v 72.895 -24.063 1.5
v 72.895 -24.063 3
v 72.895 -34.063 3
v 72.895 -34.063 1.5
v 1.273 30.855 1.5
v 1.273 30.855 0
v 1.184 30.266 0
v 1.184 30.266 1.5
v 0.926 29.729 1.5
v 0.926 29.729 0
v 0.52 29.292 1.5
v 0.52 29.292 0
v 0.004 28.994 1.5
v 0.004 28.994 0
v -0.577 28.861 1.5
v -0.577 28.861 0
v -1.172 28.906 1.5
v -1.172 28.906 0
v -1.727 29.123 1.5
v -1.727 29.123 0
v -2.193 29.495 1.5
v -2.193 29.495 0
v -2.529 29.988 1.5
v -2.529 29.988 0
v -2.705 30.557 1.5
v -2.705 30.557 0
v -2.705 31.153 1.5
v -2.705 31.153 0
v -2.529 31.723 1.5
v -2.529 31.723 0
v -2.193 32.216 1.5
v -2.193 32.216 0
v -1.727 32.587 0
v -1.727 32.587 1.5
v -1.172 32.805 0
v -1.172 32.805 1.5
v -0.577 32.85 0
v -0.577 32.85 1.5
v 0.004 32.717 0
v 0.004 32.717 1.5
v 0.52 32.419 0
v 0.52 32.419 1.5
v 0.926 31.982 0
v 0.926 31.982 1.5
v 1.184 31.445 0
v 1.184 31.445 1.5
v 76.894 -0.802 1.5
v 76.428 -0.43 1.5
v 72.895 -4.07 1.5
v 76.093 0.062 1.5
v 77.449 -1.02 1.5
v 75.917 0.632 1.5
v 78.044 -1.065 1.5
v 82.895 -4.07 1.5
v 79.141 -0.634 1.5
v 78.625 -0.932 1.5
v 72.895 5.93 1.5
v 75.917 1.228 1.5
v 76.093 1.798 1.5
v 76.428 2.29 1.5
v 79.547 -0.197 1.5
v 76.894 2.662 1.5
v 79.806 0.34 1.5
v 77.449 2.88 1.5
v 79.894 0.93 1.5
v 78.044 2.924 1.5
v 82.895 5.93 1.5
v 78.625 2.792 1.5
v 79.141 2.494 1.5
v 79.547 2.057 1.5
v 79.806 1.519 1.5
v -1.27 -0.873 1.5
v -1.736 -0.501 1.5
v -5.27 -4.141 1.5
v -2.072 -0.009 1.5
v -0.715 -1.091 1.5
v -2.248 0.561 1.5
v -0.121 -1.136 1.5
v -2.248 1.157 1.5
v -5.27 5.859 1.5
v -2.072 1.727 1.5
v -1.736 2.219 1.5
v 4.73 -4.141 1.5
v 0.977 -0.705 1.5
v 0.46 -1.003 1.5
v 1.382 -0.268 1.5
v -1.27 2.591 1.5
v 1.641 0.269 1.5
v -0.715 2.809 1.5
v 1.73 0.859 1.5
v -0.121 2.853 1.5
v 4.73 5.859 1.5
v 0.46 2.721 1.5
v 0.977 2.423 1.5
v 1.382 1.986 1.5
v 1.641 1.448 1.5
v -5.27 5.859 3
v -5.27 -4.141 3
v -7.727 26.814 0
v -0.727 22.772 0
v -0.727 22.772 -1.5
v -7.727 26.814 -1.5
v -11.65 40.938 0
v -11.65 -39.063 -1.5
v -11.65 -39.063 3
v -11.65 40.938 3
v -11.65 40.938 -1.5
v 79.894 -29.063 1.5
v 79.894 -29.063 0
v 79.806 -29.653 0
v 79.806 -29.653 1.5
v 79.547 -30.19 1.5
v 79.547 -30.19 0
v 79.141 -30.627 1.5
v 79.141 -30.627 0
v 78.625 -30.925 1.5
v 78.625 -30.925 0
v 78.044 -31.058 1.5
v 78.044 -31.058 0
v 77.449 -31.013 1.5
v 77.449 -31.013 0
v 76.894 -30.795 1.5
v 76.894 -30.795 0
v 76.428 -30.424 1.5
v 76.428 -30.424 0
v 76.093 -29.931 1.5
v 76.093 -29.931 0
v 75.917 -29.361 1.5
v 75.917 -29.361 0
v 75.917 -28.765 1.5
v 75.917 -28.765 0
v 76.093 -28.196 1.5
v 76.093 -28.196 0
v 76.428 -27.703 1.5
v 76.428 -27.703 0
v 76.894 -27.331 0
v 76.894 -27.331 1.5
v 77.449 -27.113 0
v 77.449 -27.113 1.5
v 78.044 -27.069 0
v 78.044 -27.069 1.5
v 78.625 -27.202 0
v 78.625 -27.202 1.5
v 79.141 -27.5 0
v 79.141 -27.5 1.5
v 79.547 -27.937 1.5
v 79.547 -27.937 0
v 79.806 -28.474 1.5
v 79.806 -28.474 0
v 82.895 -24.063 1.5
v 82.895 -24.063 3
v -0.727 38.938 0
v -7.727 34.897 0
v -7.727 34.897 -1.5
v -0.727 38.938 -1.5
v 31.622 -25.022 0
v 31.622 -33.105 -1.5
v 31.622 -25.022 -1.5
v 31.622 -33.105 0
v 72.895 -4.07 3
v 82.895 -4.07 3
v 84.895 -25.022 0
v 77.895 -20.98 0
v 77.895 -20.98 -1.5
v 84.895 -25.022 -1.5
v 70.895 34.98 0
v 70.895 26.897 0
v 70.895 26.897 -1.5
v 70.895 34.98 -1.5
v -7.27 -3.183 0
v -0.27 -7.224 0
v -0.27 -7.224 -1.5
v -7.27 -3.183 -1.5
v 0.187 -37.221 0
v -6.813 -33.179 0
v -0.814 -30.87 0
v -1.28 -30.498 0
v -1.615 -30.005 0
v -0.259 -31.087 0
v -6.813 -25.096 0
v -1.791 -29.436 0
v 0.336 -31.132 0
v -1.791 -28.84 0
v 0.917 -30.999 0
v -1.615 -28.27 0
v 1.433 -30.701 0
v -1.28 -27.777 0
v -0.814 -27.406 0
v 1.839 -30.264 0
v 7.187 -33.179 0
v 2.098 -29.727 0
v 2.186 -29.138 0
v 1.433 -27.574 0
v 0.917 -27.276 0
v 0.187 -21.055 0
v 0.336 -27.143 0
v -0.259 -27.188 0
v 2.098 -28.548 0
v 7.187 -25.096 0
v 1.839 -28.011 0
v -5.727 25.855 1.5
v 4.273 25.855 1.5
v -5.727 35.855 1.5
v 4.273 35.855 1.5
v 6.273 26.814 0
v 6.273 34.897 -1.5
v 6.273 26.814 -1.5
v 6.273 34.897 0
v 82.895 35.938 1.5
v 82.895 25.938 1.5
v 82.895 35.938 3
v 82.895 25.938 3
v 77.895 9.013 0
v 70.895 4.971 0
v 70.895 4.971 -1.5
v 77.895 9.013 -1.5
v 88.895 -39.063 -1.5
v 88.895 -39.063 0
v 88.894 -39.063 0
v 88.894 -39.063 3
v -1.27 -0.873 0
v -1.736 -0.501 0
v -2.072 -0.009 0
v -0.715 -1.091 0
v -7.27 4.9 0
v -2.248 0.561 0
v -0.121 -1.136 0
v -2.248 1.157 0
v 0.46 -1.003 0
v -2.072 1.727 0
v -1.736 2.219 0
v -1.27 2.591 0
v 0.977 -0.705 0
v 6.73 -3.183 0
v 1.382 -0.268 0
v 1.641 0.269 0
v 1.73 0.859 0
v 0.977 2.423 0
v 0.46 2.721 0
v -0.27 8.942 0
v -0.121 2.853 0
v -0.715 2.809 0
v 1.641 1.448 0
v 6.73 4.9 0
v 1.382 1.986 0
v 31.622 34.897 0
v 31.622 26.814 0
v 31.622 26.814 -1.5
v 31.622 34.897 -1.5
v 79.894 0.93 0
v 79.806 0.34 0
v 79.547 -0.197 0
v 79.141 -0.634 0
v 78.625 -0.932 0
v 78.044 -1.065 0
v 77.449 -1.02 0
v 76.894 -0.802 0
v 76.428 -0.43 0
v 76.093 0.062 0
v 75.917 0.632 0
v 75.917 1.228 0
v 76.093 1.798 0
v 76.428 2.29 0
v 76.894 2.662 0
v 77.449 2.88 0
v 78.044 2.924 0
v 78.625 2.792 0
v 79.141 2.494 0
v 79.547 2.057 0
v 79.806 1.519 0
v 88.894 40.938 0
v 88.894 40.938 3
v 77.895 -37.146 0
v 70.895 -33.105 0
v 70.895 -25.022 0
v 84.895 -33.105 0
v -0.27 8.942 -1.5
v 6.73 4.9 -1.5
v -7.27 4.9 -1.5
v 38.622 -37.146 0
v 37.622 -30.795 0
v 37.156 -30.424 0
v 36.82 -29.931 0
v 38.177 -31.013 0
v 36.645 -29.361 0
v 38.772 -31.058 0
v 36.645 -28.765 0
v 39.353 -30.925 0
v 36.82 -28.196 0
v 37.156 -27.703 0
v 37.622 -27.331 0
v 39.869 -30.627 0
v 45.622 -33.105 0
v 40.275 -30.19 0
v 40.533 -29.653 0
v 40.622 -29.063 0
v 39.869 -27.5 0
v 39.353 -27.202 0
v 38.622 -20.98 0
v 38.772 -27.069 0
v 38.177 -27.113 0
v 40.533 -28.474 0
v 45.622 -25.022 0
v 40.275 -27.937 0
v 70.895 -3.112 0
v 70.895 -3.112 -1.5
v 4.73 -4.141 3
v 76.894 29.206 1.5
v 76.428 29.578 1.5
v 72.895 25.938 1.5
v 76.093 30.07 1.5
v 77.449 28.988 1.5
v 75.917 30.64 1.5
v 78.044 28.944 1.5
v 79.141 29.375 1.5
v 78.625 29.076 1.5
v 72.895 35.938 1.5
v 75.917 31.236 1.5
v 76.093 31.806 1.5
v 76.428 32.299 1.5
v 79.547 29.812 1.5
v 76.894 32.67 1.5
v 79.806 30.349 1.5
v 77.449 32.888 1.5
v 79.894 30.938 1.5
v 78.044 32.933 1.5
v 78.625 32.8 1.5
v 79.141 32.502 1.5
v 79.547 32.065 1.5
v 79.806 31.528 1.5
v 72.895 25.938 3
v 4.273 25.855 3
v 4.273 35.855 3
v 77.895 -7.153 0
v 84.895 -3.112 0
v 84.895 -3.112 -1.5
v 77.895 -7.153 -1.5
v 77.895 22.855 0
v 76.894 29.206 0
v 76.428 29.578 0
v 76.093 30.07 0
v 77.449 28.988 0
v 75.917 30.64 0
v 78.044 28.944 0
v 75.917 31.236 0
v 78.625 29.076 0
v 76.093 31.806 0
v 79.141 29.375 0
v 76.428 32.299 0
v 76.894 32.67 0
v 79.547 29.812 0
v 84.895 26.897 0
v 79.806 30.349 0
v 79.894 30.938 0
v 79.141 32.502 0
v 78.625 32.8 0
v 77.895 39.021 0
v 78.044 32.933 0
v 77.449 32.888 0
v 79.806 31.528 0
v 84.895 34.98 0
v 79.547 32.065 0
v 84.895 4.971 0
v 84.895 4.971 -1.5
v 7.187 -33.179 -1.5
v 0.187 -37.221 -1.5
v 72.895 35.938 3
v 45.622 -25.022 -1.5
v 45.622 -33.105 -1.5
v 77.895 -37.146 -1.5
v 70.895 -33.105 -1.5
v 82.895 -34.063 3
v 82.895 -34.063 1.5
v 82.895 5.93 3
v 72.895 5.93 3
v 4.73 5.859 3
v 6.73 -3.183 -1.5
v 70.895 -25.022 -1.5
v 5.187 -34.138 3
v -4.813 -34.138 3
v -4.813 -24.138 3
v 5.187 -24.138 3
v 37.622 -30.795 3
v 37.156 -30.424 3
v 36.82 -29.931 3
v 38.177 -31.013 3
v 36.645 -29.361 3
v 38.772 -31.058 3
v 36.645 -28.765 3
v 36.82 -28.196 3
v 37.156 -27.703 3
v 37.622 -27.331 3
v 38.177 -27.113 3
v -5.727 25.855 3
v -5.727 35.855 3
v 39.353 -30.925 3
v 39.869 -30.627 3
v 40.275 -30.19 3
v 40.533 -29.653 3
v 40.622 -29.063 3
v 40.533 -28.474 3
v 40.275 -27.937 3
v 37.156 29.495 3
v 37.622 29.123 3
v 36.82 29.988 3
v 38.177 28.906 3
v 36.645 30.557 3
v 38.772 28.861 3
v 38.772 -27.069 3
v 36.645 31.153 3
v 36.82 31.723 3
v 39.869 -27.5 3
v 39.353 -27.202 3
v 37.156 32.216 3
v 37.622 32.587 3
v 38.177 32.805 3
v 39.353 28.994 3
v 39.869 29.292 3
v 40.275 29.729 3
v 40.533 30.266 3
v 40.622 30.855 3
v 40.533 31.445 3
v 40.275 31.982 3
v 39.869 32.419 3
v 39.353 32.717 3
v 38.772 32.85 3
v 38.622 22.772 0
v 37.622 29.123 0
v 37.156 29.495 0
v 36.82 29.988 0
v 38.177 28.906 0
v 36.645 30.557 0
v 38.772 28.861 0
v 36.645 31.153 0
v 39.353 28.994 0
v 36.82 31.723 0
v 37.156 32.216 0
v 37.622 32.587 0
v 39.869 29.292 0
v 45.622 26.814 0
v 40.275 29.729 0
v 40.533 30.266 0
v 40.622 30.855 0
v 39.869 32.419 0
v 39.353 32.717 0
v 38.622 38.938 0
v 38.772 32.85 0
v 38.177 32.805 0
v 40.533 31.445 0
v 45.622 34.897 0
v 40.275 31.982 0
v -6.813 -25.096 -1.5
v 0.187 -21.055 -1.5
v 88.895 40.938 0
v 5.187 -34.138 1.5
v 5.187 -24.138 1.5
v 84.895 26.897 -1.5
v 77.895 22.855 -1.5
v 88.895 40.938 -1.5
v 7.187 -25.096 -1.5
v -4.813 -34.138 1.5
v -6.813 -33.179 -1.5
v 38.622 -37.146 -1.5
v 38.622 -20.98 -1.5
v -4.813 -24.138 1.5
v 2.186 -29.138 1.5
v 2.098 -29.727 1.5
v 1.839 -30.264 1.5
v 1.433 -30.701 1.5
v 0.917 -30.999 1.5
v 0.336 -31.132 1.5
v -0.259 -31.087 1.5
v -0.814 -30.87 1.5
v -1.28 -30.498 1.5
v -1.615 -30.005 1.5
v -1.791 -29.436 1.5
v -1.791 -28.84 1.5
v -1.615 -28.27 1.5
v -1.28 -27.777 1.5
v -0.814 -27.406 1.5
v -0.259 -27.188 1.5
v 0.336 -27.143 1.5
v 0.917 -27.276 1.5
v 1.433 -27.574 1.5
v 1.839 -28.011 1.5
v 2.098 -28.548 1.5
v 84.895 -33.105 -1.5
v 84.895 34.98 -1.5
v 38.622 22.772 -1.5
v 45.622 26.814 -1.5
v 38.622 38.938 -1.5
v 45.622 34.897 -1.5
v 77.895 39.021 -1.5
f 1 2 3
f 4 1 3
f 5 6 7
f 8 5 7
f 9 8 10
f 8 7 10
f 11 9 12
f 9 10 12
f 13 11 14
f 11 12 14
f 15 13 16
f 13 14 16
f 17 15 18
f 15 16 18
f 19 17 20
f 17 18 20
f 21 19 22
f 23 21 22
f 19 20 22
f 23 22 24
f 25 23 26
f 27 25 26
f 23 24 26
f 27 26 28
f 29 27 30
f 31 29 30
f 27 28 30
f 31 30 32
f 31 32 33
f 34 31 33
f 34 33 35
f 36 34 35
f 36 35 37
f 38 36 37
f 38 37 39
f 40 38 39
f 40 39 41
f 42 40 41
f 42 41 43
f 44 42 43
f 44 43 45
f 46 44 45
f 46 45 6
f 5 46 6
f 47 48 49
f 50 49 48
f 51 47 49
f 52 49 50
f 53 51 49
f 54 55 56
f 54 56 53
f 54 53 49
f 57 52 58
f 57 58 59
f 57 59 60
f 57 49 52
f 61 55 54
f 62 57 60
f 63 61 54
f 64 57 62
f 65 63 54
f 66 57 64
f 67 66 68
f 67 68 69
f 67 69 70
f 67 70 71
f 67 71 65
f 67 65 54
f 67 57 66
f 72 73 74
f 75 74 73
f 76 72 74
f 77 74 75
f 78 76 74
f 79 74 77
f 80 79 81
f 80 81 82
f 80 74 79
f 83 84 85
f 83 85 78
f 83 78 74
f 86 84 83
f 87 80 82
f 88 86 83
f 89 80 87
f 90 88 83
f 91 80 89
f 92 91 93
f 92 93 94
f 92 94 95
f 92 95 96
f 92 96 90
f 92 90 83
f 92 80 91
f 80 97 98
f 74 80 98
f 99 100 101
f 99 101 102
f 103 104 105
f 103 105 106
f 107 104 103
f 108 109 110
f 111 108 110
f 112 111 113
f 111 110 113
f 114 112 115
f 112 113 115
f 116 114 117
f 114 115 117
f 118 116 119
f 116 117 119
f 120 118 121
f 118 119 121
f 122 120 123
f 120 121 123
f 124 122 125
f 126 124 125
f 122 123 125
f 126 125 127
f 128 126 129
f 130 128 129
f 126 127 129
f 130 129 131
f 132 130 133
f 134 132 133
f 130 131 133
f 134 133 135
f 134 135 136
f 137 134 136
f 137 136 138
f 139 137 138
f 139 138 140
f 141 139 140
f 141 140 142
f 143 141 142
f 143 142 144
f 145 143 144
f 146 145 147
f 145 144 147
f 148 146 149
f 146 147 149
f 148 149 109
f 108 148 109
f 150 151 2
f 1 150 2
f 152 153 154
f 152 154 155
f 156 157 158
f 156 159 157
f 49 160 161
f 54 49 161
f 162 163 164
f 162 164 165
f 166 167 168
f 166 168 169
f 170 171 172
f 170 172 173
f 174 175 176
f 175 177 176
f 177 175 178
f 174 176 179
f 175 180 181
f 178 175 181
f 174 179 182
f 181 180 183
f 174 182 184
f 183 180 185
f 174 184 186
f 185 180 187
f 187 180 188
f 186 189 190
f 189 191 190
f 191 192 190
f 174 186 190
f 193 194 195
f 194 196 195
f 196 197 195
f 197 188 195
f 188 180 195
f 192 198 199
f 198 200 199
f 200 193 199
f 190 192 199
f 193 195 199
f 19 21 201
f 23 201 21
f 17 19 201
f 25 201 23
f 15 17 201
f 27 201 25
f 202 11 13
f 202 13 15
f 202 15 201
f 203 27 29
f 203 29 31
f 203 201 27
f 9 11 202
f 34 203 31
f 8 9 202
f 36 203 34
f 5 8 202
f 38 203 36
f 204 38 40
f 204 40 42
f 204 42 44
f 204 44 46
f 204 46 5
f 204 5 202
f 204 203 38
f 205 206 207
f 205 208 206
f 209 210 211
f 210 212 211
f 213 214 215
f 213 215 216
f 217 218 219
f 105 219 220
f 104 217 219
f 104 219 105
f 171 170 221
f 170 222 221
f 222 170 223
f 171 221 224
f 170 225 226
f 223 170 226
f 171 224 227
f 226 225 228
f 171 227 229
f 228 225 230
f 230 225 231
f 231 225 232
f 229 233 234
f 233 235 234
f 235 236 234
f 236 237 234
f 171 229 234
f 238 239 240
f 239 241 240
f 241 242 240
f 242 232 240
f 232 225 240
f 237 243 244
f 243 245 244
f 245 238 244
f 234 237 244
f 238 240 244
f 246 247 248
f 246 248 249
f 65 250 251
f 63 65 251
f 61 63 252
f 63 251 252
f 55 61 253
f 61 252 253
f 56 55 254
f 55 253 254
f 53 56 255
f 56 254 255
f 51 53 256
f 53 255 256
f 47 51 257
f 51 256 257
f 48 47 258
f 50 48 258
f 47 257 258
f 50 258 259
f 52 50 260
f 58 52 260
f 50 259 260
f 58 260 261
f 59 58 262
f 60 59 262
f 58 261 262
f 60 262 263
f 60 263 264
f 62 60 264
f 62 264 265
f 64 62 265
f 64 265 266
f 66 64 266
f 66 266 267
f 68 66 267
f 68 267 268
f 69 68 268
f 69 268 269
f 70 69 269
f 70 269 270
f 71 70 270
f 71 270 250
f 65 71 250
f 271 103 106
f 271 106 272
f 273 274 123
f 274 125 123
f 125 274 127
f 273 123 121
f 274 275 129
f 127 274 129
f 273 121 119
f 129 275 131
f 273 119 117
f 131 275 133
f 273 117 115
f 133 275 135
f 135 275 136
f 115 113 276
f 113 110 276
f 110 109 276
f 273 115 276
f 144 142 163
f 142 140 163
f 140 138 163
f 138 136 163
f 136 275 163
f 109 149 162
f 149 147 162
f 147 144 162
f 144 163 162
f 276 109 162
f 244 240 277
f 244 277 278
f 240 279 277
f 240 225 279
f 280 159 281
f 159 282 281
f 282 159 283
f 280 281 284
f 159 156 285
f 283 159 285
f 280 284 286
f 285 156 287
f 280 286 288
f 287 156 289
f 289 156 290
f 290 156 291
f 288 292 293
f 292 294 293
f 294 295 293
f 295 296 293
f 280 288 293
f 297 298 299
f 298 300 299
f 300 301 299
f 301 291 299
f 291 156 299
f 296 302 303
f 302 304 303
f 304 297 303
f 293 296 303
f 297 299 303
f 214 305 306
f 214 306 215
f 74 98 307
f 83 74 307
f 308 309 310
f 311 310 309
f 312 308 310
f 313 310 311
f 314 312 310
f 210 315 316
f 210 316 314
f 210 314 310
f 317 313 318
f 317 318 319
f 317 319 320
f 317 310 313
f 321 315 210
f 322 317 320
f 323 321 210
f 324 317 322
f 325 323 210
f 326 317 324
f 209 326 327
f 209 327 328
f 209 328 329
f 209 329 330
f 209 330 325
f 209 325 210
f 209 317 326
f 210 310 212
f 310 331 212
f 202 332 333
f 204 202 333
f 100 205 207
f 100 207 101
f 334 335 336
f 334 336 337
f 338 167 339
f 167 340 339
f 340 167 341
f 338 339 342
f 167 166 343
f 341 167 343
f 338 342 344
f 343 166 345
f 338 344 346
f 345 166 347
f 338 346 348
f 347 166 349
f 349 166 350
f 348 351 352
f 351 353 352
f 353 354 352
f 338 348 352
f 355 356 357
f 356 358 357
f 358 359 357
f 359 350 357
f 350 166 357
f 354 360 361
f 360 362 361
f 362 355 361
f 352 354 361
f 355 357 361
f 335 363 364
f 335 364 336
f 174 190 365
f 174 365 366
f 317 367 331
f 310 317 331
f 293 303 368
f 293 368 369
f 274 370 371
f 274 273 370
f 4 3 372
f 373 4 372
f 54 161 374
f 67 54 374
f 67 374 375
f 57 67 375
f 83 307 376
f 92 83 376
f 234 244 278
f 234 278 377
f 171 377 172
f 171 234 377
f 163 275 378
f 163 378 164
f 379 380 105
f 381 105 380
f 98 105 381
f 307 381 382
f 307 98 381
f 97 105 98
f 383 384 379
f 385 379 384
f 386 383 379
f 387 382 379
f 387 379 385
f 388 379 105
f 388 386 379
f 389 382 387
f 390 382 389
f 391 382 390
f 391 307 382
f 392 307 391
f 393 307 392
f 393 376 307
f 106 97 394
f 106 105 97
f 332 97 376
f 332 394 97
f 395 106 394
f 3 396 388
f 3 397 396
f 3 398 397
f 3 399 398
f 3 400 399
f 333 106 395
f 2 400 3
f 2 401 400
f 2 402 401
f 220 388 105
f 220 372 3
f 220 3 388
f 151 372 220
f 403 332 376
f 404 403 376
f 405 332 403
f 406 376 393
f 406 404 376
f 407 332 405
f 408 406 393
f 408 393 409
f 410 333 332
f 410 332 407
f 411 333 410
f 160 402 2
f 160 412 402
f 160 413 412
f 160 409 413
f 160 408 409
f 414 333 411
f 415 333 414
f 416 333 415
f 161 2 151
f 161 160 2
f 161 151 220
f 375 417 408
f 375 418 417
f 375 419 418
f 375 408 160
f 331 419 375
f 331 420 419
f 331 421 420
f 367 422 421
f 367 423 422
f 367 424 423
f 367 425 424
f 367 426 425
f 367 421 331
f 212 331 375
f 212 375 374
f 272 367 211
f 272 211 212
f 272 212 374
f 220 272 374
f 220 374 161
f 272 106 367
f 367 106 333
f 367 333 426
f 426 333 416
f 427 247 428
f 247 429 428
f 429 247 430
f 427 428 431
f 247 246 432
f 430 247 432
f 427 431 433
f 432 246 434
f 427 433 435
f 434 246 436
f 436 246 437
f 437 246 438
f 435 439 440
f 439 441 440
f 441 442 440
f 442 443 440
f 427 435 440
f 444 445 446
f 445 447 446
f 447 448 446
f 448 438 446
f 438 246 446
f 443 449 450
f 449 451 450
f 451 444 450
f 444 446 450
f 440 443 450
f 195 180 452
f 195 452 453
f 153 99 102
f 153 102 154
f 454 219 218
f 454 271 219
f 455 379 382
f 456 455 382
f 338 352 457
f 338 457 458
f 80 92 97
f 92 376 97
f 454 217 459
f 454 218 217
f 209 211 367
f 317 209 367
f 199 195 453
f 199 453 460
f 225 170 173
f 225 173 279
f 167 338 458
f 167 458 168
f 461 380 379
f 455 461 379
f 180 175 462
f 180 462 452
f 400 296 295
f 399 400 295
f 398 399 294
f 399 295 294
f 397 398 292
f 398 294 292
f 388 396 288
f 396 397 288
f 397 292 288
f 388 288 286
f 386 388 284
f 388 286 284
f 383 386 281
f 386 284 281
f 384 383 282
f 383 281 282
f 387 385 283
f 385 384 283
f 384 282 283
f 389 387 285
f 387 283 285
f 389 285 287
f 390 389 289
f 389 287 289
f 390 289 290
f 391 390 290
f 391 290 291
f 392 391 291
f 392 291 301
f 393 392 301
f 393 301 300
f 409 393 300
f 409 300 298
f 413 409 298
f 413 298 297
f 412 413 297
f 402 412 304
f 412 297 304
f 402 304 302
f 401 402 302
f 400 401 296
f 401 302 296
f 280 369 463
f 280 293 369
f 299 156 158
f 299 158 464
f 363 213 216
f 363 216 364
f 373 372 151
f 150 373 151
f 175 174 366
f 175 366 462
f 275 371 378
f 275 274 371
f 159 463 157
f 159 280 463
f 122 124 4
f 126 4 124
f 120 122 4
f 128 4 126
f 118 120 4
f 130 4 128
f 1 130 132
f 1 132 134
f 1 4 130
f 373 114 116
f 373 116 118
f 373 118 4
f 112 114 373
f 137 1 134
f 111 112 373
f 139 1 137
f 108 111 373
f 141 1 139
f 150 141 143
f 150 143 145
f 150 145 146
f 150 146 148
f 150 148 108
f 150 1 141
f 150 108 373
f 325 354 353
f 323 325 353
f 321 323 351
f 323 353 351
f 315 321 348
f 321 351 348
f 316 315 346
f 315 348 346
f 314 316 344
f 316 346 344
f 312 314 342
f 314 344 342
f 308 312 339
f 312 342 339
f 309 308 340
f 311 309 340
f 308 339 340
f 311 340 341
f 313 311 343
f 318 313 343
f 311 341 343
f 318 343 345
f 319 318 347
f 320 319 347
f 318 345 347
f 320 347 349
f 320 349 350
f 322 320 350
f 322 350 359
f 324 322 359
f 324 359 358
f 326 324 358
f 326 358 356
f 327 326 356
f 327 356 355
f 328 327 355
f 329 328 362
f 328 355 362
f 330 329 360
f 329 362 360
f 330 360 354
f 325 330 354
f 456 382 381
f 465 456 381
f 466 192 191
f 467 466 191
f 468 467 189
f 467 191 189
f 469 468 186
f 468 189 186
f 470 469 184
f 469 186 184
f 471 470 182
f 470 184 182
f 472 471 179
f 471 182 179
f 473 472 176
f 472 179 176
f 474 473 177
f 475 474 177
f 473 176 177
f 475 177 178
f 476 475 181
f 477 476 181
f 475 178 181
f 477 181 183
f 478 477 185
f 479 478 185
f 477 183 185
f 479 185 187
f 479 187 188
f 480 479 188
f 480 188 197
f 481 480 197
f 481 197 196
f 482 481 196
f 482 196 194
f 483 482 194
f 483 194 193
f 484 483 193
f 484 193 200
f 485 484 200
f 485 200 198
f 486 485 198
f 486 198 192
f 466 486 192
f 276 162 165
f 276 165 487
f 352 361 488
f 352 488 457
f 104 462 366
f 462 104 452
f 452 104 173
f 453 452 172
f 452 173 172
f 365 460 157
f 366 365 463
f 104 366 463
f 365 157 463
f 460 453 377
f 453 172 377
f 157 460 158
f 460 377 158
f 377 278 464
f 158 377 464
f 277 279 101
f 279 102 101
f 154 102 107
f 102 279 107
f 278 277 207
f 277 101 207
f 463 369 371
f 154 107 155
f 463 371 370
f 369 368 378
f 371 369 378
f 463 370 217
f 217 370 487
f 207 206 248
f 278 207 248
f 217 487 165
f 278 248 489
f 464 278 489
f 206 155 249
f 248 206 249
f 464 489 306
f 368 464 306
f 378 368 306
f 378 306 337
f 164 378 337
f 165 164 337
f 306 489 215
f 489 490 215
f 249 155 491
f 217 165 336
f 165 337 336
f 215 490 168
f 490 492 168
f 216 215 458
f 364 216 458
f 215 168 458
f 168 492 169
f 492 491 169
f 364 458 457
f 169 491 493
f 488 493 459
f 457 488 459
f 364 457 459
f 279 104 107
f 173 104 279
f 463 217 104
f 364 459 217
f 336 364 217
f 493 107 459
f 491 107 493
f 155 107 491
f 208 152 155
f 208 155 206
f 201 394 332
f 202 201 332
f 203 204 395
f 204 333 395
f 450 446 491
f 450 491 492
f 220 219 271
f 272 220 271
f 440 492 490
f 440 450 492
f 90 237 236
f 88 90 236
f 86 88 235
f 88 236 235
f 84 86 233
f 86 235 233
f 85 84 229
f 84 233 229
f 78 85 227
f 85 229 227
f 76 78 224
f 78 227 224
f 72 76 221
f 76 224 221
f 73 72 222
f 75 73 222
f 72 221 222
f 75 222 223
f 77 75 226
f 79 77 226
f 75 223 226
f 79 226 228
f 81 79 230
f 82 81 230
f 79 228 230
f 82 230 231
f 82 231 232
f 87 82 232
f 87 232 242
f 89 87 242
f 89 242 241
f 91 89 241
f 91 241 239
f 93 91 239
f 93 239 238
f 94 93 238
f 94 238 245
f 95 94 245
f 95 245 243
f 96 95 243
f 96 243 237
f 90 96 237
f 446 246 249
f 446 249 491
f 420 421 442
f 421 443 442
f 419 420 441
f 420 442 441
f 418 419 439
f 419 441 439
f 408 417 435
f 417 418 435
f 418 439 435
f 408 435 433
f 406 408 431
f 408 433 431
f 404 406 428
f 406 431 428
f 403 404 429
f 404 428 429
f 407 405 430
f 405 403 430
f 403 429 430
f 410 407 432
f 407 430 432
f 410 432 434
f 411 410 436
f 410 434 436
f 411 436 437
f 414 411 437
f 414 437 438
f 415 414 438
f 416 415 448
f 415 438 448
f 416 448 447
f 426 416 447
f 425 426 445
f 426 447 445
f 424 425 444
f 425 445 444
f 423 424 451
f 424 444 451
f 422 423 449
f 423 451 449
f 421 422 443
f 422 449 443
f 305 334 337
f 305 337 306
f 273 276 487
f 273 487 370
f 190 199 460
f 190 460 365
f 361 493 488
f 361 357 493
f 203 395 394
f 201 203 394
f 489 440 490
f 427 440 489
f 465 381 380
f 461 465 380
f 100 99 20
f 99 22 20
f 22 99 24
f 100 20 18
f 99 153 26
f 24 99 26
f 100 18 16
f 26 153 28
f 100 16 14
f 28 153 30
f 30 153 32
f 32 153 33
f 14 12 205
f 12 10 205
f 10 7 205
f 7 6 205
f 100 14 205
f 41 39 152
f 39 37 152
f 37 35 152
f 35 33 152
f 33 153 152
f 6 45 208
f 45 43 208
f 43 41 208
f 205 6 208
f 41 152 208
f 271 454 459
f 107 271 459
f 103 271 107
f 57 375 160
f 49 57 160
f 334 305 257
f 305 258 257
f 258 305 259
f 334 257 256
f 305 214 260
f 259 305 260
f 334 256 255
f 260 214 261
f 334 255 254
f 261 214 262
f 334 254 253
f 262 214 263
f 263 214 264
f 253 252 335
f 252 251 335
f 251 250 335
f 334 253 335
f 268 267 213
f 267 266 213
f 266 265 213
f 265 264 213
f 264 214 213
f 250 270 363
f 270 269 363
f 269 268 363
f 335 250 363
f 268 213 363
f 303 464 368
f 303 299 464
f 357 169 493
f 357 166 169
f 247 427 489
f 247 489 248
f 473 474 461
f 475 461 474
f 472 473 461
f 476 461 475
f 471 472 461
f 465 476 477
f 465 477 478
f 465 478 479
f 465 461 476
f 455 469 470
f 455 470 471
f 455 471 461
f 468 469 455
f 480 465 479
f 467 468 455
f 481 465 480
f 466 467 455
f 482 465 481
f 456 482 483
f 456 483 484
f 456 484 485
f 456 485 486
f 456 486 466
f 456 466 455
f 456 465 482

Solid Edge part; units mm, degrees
sketch "Sketch1" plane through (0, 0, 0) normal (0, 0, 1) x (1, 0, 0)
  line L0 (88.8945, 25.9382) -> (88.8945, 40.9382)
  line L1 (-11.6502, 40.9382) -> (88.8945, 40.9382)
  line L2 (-11.6502, -39.0633) -> (-11.6502, 40.9382)
  line L3 (88.8945, -39.0633) -> (-11.6502, -39.0633)
  line L4 (88.8945, -39.0633) -> (88.8945, -24.0633)
  line L5 (88.8945, 25.9382) -> (88.8945, -24.0633)
  circle A0 centre (38.6222, 30.8554) radius 2
  circle A1 centre (38.6222, -29.0633) radius 2
  circle A2 centre (-0.7269, 30.8554) radius 2
  circle A3 centre (-0.2702, 0.8589) radius 2
  circle A4 centre (0.1865, -29.1376) radius 2
  circle A5 centre (77.8945, -29.0633) radius 2
  circle A6 centre (77.8945, 0.9299) radius 2
  circle A7 centre (77.8945, 30.9382) radius 2
  dimension "D1" = 6
  dimension "D2" = 6
extrude "Protrusion1" add sketch "Sketch1" along normal blind 3
sketch "Sketch2" plane through (38.6222, 0.9374, 3) normal (0, 0, 1) x (1, 0, 0)
  line L0 (-44.3491, 24.918) -> (-34.3491, 24.918)
  line L1 (-34.3491, 24.918) -> (-34.3491, 34.918)
  line L2 (-34.3491, 34.918) -> (-44.3491, 34.918)
  line L3 (-44.3491, 34.918) -> (-44.3491, 24.918)
  line L4 (34.2724, 25.0007) -> (44.2724, 25.0007)
  line L5 (44.2724, 25.0007) -> (44.2724, 35.0007)
  line L6 (44.2724, 35.0007) -> (34.2724, 35.0007)
  line L7 (34.2724, 35.0007) -> (34.2724, 25.0007)
  line L8 (34.2724, -5.0076) -> (44.2724, -5.0076)
  line L9 (44.2724, -5.0076) -> (44.2724, 4.9924)
  line L10 (44.2724, 4.9924) -> (34.2724, 4.9924)
  line L11 (34.2724, 4.9924) -> (34.2724, -5.0076)
  line L12 (34.2724, -35.0007) -> (44.2724, -35.0007)
  line L13 (44.2724, -35.0007) -> (44.2724, -25.0007)
  line L14 (44.2724, -25.0007) -> (34.2724, -25.0007)
  line L15 (34.2724, -25.0007) -> (34.2724, -35.0007)
  line L16 (-43.4356, -35.0751) -> (-33.4356, -35.0751)
  line L17 (-33.4356, -35.0751) -> (-33.4356, -25.0751)
  line L18 (-33.4356, -25.0751) -> (-43.4356, -25.0751)
  line L19 (-43.4356, -25.0751) -> (-43.4356, -35.0751)
  line L20 (-43.8924, -5.0785) -> (-33.8924, -5.0785)
  line L21 (-33.8924, -5.0785) -> (-33.8924, 4.9215)
  line L22 (-33.8924, 4.9215) -> (-43.8924, 4.9215)
  line L23 (-43.8924, 4.9215) -> (-43.8924, -5.0785)
extrude "ExtrudedCutout_1" cut sketch "Sketch2" against normal blind 1.5
sketch "Sketch3" plane through (38.6222, 0.9374, 0) normal (0, 0, -1) x (1, 0, 0)
  line L0 (-45.4356, 26.0336) -> (-38.4356, 21.9922)
  line L1 (-38.4356, 21.9922) -> (-31.4356, 26.0336)
  line L2 (-31.4356, 26.0336) -> (-31.4356, 34.1165)
  line L3 (-31.4356, 34.1165) -> (-38.4356, 38.158)
  line L4 (-38.4356, 38.158) -> (-45.4356, 34.1165)
  line L5 (-45.4356, 34.1165) -> (-45.4356, 26.0336)
  line L6 (-45.8924, -3.9629) -> (-38.8924, -8.0044)
  line L7 (-38.8924, -8.0044) -> (-31.8924, -3.9629)
  line L8 (-31.8924, -3.9629) -> (-31.8924, 4.12)
  line L9 (-31.8924, 4.12) -> (-38.8924, 8.1614)
  line L10 (-38.8924, 8.1614) -> (-45.8924, 4.12)
  line L11 (-45.8924, 4.12) -> (-45.8924, -3.9629)
  line L12 (-32.3491, -25.8765) -> (-39.3491, -21.8351)
  line L13 (-39.3491, -21.8351) -> (-46.3491, -25.8765)
  line L14 (-46.3491, -25.8765) -> (-46.3491, -33.9594)
  line L15 (-46.3491, -33.9594) -> (-39.3491, -38.0009)
  line L16 (-39.3491, -38.0009) -> (-32.3491, -33.9594)
  line L17 (-32.3491, -33.9594) -> (-32.3491, -25.8765)
  line L18 (7, -25.8765) -> (0, -21.8351)
  line L19 (0, -21.8351) -> (-7, -25.8765)
  line L20 (-7, -25.8765) -> (-7, -33.9594)
  line L21 (-7, -33.9594) -> (0, -38.0009)
  line L22 (0, -38.0009) -> (7, -33.9594)
  line L23 (7, -33.9594) -> (7, -25.8765)
  line L24 (7, 34.0422) -> (0, 38.0836)
  line L25 (0, 38.0836) -> (-7, 34.0422)
  line L26 (-7, 34.0422) -> (-7, 25.9593)
  line L27 (-7, 25.9593) -> (0, 21.9178)
  line L28 (0, 21.9178) -> (7, 25.9593)
  line L29 (7, 25.9593) -> (7, 34.0422)
  line L30 (46.2724, 4.049) -> (39.2724, 8.0905)
  line L31 (39.2724, 8.0905) -> (32.2724, 4.049)
  line L32 (32.2724, 4.049) -> (32.2724, -4.0339)
  line L33 (32.2724, -4.0339) -> (39.2724, -8.0753)
  line L34 (39.2724, -8.0753) -> (46.2724, -4.0339)
  line L35 (46.2724, -4.0339) -> (46.2724, 4.049)
  line L36 (46.2724, 34.0422) -> (39.2724, 38.0836)
  line L37 (39.2724, 38.0836) -> (32.2724, 34.0422)
  line L38 (32.2724, 34.0422) -> (32.2724, 25.9593)
  line L39 (32.2724, 25.9593) -> (39.2724, 21.9178)
  line L40 (39.2724, 21.9178) -> (46.2724, 25.9593)
  line L41 (46.2724, 25.9593) -> (46.2724, 34.0422)
  line L42 (46.2724, -25.9593) -> (39.2724, -21.9178)
  line L43 (39.2724, -21.9178) -> (32.2724, -25.9593)
  line L44 (32.2724, -25.9593) -> (32.2724, -34.0422)
  line L45 (32.2724, -34.0422) -> (39.2724, -38.0836)
  line L46 (39.2724, -38.0836) -> (46.2724, -34.0422)
  line L47 (46.2724, -34.0422) -> (46.2724, -25.9593)
  line L48 (-50.2724, 40.0007) -> (50.2724, 40.0007)
  line L49 (50.2724, 40.0007) -> (50.2724, -40.0007)
  line L50 (50.2724, -40.0007) -> (-50.2724, -40.0007)
  line L51 (-50.2724, -40.0007) -> (-50.2724, 40.0007)
extrude "ExtrudedProtrusion_2" add sketch "Sketch3" along normal blind 1.5
